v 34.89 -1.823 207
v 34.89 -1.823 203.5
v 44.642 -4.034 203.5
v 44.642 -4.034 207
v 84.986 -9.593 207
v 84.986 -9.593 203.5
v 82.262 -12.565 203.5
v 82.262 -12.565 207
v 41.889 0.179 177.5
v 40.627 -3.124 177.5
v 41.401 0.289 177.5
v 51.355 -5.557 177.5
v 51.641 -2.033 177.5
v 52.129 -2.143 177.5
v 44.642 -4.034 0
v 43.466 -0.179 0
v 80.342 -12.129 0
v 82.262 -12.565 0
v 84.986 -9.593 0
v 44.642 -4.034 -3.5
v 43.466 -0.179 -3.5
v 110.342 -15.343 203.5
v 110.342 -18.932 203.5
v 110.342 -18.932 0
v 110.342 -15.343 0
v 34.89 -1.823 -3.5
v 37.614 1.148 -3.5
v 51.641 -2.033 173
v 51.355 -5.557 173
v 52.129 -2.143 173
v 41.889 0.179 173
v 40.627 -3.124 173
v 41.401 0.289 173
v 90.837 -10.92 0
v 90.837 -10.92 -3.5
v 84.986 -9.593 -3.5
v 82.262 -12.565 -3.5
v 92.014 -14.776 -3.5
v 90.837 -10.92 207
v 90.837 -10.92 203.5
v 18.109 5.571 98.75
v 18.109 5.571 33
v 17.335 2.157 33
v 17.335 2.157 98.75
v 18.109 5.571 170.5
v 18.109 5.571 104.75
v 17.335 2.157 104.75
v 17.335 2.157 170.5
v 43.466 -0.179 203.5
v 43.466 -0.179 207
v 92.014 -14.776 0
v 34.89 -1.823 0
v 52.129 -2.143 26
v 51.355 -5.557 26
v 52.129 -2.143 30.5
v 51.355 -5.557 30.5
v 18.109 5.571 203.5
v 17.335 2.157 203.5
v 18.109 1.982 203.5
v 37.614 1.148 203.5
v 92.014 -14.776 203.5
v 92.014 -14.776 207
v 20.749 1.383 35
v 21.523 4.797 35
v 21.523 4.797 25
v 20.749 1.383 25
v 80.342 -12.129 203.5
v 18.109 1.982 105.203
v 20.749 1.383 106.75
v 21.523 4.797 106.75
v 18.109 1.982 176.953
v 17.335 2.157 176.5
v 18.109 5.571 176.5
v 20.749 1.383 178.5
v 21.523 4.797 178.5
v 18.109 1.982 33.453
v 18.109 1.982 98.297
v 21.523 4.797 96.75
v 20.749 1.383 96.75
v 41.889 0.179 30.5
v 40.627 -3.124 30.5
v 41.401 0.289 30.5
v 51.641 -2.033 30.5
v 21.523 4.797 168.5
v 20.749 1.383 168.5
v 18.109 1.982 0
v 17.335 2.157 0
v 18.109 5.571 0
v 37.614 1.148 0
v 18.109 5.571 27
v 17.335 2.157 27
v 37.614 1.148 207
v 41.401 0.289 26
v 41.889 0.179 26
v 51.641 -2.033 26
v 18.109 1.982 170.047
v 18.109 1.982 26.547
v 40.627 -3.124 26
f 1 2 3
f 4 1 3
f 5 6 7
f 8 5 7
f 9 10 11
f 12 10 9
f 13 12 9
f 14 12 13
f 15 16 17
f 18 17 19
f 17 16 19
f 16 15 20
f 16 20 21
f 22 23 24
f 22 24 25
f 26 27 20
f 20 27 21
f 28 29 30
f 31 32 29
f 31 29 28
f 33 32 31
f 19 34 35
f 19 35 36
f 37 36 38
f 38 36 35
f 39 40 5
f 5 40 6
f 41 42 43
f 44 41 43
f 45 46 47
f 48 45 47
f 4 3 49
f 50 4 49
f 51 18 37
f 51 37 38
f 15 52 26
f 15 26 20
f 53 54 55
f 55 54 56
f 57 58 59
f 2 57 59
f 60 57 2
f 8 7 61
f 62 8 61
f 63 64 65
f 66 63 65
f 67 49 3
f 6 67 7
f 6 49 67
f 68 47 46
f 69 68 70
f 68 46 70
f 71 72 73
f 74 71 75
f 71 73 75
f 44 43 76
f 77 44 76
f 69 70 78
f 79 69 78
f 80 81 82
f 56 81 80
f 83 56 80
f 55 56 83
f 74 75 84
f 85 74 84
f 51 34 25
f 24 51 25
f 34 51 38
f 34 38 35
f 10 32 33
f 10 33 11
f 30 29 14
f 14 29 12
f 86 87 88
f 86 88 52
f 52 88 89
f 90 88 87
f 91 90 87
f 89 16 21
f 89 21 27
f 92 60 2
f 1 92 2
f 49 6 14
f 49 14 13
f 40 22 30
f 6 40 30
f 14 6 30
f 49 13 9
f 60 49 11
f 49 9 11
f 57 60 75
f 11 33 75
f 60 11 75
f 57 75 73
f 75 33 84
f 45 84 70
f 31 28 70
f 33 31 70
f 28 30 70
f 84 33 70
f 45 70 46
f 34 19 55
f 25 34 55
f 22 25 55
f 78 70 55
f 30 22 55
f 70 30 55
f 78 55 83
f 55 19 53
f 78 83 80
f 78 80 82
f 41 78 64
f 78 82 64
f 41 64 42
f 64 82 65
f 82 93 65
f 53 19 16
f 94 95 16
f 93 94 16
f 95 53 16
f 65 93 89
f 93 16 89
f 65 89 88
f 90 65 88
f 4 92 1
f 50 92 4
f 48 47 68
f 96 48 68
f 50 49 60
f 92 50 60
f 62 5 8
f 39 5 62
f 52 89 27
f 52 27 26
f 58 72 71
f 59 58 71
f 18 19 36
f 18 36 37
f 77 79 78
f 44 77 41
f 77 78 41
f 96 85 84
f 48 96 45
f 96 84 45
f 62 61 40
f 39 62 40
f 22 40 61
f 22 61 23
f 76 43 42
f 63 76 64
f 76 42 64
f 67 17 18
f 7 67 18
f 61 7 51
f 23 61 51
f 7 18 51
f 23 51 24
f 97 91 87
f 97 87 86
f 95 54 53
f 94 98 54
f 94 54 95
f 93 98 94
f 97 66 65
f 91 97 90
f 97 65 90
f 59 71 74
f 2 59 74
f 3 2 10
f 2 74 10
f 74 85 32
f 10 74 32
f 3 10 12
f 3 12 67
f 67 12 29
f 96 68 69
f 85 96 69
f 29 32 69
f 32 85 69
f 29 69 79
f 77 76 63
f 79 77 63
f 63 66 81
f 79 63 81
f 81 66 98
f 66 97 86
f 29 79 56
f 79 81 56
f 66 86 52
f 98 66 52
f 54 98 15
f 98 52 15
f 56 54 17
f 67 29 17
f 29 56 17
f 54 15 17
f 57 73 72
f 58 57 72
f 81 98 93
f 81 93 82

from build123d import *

# Parameters (mm, degrees)
F1_DEPTH  = 203.5
F3_DEPTH  = 3.5
F4_DEPTH  = 210.5
F6_DEPTH  = 25
F7_W      = 10
F7_H      = 4.5
F8_DEPTH  = 25
F9_DEPTH  = 0.5
F10_DEPTH = 0.5


with BuildPart() as f1:
    # F0 (on Top) → F1 (new body)
    with BuildSketch(Plane.XY):
        Polygon((18.1093649228, 1.9817664346), (80.342321908, -12.1293889498), (110.342321908, -18.9318081509), (110.342321908, -15.3429607484), (18.1093649228, 5.5706138371), (17.3353965158, 2.1572616864), align=None)
    extrude(amount=F1_DEPTH)

    # F2 (on face) → F3 (join)
    with BuildSketch(Plane.XY.offset(203.5)):
        Polygon((43.4656951855, -0.1788657578), (37.6142343556, 1.1479372257), (34.8897790053, -1.8231472639), (44.6422137217, -4.0344855696), align=None)
        Polygon((90.8374524752, -10.9202841369), (84.9859916454, -9.5934811535), (82.2615362951, -12.5645656431), (92.0139710115, -14.7759039488), align=None)
    extrude(amount=F3_DEPTH)

    # F4 (add): faces of the model
    f4_faces = [f1.faces().sort_by_distance(p)[0] for p in [
        (40.1207318834, -1.3643633477, 207),
        (87.4924891732, -12.1057817269, 207),
    ]]
    extrude(f4_faces, amount=-F4_DEPTH)

    # F5 (on face) → F6 (cut)
    with BuildSketch(Plane(origin=(2.0869058597, 9.2036632764, 0), x_dir=(-0.9752434716, 0.2211338306, 0), z_dir=(0.2211338306, 0.9752434716, 0))):
        Polygon((-16.4291887401, 170.5), (-16.4291887401, 176.5), (-19.9291887401, 178.5), (-19.9291887401, 168.5), align=None)
        Polygon((-16.4291887401, 101.75), (-16.4291887401, 104.75), (-19.9291887401, 106.75), (-19.9291887401, 101.75), (-19.9291887401, 96.75), (-16.4291887401, 98.75), align=None)
        Polygon((-16.4291887401, 27), (-16.4291887401, 33), (-19.9291887401, 35), (-19.9291887401, 25), align=None)
    extrude(amount=-F6_DEPTH, mode=Mode.SUBTRACT)

    # F7 (on face) → F8 (cut)
    with BuildSketch(Plane(origin=(1.3129374527, 5.7903111257, 0), x_dir=(0.9752434716, -0.2211338306, 0), z_dir=(-0.2211338306, -0.9752434716, 0))):
        with Locations((45.8121887401, 175.25)):
            Rectangle(F7_W, F7_H)
        with Locations((45.8121887401, 28.25)):
            Rectangle(F7_W, F7_H)
    extrude(amount=-F8_DEPTH, mode=Mode.SUBTRACT)

    # F9 (cut): faces of the model
    f9_faces = [f1.faces().sort_by_distance(p)[0] for p in [
        (41.5017422883, -1.5279684291, 175.25),
        (41.5017422883, -1.5279684291, 28.25),
    ]]
    extrude(f9_faces, amount=-F9_DEPTH, mode=Mode.SUBTRACT)

    # F10 (cut): faces of the model
    f10_faces = [f1.faces().sort_by_distance(p)[0] for p in [
        (51.2541770047, -3.7393067348, 175.25),
        (51.2541770047, -3.7393067348, 28.25),
    ]]
    extrude(f10_faces, amount=-F10_DEPTH, mode=Mode.SUBTRACT)


solid = f1.part
